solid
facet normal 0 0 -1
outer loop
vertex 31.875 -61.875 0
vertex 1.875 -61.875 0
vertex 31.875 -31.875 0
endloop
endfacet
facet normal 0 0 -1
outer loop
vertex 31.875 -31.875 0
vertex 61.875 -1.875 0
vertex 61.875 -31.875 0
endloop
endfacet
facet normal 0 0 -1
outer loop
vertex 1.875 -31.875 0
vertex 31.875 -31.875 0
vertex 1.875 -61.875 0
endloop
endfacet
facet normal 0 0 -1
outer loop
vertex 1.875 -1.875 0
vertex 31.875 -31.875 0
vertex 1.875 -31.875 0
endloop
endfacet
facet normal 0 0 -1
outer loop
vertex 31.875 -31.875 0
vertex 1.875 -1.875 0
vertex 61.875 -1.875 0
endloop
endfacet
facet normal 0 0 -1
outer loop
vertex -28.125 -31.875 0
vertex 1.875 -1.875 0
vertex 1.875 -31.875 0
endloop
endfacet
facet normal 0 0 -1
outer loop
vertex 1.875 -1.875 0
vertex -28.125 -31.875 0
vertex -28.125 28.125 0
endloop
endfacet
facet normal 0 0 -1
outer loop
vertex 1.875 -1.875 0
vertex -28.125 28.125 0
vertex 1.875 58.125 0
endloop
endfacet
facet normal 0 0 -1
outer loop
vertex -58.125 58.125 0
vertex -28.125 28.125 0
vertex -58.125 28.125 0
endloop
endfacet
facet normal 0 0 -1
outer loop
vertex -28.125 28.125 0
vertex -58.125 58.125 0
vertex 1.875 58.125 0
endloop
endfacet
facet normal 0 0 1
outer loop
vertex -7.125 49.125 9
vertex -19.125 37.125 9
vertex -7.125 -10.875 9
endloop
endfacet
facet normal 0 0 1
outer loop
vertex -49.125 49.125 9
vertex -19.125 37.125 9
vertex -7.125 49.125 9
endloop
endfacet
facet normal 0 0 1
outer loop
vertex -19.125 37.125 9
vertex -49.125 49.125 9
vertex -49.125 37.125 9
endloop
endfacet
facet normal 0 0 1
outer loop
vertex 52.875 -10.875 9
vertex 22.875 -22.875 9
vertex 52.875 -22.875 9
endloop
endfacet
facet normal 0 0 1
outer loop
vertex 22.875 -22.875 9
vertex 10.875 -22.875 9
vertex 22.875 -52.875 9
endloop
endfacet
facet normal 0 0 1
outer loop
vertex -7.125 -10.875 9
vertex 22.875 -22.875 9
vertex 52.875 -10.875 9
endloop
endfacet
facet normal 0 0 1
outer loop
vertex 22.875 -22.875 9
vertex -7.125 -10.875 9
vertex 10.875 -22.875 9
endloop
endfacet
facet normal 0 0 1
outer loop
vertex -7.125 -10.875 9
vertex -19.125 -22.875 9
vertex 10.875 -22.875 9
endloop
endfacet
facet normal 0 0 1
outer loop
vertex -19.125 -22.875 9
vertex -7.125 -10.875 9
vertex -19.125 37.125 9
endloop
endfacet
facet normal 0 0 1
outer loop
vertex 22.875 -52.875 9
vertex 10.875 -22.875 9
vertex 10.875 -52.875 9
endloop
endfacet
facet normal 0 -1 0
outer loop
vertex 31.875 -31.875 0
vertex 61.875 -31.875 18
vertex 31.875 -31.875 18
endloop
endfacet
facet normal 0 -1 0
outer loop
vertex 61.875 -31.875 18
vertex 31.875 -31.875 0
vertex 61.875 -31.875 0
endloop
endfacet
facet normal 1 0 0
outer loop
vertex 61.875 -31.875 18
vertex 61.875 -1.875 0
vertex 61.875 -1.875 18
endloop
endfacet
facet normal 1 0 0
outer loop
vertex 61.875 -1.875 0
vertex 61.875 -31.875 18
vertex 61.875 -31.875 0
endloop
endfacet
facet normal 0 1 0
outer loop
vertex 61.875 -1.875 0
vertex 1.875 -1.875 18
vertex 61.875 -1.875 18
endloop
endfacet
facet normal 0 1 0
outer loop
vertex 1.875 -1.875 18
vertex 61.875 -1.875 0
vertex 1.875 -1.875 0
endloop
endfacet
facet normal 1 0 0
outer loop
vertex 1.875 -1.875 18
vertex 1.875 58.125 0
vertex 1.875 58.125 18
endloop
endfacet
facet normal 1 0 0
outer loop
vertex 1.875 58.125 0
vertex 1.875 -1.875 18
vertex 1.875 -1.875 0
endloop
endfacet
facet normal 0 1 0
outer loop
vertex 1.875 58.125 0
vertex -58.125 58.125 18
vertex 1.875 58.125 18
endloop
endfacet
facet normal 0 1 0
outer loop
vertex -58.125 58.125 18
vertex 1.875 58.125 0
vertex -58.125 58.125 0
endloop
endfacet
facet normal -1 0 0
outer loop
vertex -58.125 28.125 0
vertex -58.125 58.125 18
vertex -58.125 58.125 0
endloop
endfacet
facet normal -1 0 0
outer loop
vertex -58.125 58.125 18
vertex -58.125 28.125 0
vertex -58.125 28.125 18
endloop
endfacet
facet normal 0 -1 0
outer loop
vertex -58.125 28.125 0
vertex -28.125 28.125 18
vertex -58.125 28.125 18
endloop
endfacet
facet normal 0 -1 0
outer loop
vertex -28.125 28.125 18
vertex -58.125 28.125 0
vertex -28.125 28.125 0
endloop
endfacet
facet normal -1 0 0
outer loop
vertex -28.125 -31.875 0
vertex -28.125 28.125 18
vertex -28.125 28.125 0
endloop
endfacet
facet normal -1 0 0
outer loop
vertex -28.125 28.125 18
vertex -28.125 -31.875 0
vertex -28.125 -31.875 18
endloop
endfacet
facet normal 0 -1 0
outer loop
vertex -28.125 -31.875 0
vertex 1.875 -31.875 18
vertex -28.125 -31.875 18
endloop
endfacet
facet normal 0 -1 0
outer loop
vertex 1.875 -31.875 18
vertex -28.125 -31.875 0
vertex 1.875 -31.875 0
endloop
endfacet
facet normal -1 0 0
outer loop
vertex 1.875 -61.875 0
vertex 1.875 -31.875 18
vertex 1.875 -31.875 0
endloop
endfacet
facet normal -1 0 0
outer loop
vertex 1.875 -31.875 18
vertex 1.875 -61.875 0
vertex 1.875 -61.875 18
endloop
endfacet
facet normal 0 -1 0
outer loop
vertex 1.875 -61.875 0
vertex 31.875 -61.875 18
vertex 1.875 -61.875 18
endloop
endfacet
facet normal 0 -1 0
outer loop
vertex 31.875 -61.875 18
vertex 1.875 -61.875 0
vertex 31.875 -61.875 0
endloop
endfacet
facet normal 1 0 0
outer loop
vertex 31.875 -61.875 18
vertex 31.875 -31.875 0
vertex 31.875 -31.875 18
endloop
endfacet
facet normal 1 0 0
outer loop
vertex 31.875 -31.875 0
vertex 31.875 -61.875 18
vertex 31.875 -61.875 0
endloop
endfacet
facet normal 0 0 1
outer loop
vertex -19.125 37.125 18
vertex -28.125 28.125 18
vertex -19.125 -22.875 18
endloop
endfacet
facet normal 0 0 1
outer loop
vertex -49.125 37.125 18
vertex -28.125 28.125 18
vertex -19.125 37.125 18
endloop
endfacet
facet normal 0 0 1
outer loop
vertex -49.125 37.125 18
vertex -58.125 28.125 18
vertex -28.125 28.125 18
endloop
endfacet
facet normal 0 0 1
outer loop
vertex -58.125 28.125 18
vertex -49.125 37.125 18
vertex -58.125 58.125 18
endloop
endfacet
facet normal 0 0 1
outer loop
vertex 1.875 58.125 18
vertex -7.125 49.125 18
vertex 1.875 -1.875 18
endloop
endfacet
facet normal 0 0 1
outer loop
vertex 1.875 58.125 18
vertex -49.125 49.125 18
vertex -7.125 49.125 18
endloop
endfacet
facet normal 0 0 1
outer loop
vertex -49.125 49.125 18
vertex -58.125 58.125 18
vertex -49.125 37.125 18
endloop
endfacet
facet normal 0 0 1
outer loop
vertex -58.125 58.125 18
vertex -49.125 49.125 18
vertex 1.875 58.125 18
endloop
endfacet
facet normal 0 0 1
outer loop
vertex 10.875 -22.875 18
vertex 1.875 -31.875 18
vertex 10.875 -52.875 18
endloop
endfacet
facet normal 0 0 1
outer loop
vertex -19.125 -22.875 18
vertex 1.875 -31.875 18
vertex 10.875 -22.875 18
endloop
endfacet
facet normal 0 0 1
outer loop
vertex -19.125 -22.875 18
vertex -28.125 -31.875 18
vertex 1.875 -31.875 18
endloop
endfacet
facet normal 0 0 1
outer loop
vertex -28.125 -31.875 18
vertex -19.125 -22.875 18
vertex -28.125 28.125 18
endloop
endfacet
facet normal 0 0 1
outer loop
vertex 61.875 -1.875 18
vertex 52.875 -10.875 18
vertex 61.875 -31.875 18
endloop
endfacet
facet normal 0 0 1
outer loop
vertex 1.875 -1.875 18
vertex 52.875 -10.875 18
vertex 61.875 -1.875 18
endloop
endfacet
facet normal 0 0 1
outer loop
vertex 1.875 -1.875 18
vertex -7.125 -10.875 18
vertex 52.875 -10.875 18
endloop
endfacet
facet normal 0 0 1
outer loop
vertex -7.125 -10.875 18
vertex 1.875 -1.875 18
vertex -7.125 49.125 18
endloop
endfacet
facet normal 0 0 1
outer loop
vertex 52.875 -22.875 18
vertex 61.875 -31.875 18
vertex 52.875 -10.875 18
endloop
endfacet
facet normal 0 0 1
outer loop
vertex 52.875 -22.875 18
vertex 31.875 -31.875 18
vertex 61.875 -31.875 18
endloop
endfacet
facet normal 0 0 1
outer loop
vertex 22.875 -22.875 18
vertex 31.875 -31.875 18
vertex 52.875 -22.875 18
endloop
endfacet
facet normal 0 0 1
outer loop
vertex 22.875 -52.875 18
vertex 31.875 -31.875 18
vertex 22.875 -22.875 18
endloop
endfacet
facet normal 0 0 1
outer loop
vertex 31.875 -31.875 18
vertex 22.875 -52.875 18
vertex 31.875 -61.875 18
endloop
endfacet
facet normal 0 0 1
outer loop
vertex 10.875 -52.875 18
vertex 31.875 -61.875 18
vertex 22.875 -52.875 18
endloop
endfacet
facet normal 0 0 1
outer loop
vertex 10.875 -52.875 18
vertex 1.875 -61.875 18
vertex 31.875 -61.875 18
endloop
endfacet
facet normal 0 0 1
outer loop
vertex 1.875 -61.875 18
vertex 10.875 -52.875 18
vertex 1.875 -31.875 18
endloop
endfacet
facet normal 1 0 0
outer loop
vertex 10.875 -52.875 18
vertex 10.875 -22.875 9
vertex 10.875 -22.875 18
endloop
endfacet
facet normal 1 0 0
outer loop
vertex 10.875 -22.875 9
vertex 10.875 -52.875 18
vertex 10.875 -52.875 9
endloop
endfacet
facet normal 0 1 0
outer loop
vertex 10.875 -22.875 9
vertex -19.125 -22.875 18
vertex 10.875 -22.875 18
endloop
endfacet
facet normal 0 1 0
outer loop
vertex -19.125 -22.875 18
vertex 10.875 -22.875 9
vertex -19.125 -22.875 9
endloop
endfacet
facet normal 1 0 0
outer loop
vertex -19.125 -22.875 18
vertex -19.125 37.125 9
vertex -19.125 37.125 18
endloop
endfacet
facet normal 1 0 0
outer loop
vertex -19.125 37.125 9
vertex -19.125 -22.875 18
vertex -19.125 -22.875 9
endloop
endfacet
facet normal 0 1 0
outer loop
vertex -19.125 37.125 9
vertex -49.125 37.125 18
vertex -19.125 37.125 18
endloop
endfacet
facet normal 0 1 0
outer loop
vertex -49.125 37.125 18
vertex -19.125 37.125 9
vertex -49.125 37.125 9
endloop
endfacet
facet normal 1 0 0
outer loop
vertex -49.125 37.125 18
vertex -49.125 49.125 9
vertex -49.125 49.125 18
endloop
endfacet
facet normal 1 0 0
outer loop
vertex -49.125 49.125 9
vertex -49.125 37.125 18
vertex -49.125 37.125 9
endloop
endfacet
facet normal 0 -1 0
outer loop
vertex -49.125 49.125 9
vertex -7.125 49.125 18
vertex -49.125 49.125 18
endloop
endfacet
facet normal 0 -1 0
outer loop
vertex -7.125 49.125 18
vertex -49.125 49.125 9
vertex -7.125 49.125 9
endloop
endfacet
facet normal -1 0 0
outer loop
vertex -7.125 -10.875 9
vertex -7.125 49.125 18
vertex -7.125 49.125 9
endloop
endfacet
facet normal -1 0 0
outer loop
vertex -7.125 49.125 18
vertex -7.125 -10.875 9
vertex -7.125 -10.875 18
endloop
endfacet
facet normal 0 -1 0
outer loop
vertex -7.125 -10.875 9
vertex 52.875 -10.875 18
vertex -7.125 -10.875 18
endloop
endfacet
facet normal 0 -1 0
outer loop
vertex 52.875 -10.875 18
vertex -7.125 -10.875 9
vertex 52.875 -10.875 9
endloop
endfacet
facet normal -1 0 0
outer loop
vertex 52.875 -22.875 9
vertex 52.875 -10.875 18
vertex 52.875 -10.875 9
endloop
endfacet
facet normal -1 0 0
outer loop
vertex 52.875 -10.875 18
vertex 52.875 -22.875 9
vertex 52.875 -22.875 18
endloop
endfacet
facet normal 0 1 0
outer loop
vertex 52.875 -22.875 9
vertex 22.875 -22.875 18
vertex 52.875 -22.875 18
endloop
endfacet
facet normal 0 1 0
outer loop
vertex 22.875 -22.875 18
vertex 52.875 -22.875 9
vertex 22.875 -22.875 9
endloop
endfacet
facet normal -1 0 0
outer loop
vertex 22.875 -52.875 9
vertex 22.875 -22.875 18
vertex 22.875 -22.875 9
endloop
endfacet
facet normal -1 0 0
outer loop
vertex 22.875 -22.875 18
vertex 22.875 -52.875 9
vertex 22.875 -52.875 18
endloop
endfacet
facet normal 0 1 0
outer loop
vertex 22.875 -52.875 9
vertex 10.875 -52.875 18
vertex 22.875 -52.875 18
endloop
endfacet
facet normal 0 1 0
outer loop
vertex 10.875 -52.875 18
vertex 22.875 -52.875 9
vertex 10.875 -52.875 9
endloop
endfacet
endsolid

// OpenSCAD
/*
Heptominos using Freeman codes

Kit Wallace 2019-04-04
"
*/
//use <../lib/tile_fns.scad>
//overall scale 
scale=30;
//height of base tile = 0 for 2d tiles
base_height=0.3;
//defines the overall base offset/ inset - tune for snug fit
base_offset=0;
//height of border
border_height=0.3;
//thickness of border
border_thickness=0.3;
// polyomino to print 0..34  -1 is all
polyomino=89;
// for chiral shapes : 0 = as given 1 = mirror
mirror=0;

polyominoes=
   ["3011111112333333", "0121111123333330", "0121111233333301", "0121112333333011", "12111233333001", "3011211112333330", "0122111123333300", "0121123333300121", "0121233333001211", "0122333330012111", "2303333001211112", "2303330012111123", "2303300121111233", "2303001211112333", "2300012111123333", "12112333330101", "0122111233333010", "0121233333010121", "2303330101211123", "2303301012111233", "2303010121112333", "0122112333330110", "2303301101211233", "121233330011", "30111211233330", "01221123333001", "01223333001121", "01212112333300", "23033300112112", "23033001121123", "23030011211233", "23000112112333", "3011121112333303", "0121211123333030", "0122111233330301", "0121233330301121", "0122333303011211", "2303330301121112", "2303303011211123", "2303030112111233", "2300301121112333", "3011221112333300", "0122211123333000", "0121233330001221", "0122333300012211", "1232111233330001", "2303330001221112", "2303300012211123", "2303000122111233", "2300001221112333", "0122123333001210", "2303330012101212", "2303300121012123", "2303001210121233", "2300012101212333", "2303330012110122", "2303300121101223", "30300121112323", "2300330012111232", "2300300121112332", "01221233330101", "23033010112123", "3011221123333010", "1232112333301001", "2303301001221123", "2303010012211233", "012223330011", "012122333001", "01211212333030", "01212123330301", "01221233303011", "12321233300101", "23033001012212", "30112121233300", "303001121223", "12330330011212", "23003300112122", "0121121123330330", "0121211233303301", "0122112333033011", "0122333033011121", "3011212112333030", "0122121123330300", "0122333030012121", "2303303001212112", "2303030012121123", "2300300121211233", "0122333030101221", "1232112333030101", "2303303010122112", "2303030101221123", "0122233303011210", "1232333030112101", "2303303011210122", "2303030112101223", "2300301121012233", "1233033030112112", "2300330301121122", "2300301121122303", "3010301121123323", "3011122112333003", "0122333003011221", "1232112333003011", "2303300301122112", "0122233300012210", "1232101223330001", "2300012101222303", "0121212123303030"]
;
// echo(polyominos);
scale(scale)

if (polyomino==-1)   
   for(i=[0:len(polyominoes)-1]) {  
      translate([5*(i%12),-7*floor(i/12)]) {
         code=polyominoes[i];
         print_polyomino(code);
      }
   }
else {
    c = polyominoes[polyomino];
    if (mirror==0)
       print_polyomino(c);
    else { mc=mirror_code(c);
           print_polyomino(mc);
        } 
    } 
 

module print_polyomino(code) {    
   tile=centre_tile(freeman4_to_points(code));
//   echo(tile);
   if (base_height >0)
   union() {
      linear_extrude(height=base_height)
        offset(delta=base_offset)
          polygon(tile);
      translate([0,0,base_height])
        linear_extrude(height=border_height)
        difference(){
            offset(delta=base_offset)
                polygon(tile);
            offset(delta=-border_thickness)
               polygon(tile);       
        }
    } 
   else 
     difference() {
        offset(delta=base_offset)
         polygon(tile);  
        offset(delta=-border_thickness)
         polygon(tile);  

     } 
}

function freeman4_to_points(code,point=[0,0],i=0) =
     i == len(code)
     ?  []
     :  let (m=code[i])
        let (step =
              m=="0" ? [1,0]
             :m=="1" ? [0,1]
             :m=="2" ? [-1,0]
             :m=="3" ? [0,-1]
             :[0,0])
        concat([point],freeman4_to_points(code,point+step,i+1) )
     ;


function mirror_code(code,i=0) =
    i <len(code)
     ? let(m=code[i])
       let(c=
           m=="0" ? "2"
         : m=="2" ? "0"
         : m)
       str(c,mirror_code(code,i+1))
     :"";
   
function v_sum(v,i=0)=
    i<len(v)
      ? v[i]+v_sum(v,i+1)
      : [0,0] ;
         
function centre_tile(t) =
    let(c = v_sum(t) / len(t))
    [for (p=t) p-c];
